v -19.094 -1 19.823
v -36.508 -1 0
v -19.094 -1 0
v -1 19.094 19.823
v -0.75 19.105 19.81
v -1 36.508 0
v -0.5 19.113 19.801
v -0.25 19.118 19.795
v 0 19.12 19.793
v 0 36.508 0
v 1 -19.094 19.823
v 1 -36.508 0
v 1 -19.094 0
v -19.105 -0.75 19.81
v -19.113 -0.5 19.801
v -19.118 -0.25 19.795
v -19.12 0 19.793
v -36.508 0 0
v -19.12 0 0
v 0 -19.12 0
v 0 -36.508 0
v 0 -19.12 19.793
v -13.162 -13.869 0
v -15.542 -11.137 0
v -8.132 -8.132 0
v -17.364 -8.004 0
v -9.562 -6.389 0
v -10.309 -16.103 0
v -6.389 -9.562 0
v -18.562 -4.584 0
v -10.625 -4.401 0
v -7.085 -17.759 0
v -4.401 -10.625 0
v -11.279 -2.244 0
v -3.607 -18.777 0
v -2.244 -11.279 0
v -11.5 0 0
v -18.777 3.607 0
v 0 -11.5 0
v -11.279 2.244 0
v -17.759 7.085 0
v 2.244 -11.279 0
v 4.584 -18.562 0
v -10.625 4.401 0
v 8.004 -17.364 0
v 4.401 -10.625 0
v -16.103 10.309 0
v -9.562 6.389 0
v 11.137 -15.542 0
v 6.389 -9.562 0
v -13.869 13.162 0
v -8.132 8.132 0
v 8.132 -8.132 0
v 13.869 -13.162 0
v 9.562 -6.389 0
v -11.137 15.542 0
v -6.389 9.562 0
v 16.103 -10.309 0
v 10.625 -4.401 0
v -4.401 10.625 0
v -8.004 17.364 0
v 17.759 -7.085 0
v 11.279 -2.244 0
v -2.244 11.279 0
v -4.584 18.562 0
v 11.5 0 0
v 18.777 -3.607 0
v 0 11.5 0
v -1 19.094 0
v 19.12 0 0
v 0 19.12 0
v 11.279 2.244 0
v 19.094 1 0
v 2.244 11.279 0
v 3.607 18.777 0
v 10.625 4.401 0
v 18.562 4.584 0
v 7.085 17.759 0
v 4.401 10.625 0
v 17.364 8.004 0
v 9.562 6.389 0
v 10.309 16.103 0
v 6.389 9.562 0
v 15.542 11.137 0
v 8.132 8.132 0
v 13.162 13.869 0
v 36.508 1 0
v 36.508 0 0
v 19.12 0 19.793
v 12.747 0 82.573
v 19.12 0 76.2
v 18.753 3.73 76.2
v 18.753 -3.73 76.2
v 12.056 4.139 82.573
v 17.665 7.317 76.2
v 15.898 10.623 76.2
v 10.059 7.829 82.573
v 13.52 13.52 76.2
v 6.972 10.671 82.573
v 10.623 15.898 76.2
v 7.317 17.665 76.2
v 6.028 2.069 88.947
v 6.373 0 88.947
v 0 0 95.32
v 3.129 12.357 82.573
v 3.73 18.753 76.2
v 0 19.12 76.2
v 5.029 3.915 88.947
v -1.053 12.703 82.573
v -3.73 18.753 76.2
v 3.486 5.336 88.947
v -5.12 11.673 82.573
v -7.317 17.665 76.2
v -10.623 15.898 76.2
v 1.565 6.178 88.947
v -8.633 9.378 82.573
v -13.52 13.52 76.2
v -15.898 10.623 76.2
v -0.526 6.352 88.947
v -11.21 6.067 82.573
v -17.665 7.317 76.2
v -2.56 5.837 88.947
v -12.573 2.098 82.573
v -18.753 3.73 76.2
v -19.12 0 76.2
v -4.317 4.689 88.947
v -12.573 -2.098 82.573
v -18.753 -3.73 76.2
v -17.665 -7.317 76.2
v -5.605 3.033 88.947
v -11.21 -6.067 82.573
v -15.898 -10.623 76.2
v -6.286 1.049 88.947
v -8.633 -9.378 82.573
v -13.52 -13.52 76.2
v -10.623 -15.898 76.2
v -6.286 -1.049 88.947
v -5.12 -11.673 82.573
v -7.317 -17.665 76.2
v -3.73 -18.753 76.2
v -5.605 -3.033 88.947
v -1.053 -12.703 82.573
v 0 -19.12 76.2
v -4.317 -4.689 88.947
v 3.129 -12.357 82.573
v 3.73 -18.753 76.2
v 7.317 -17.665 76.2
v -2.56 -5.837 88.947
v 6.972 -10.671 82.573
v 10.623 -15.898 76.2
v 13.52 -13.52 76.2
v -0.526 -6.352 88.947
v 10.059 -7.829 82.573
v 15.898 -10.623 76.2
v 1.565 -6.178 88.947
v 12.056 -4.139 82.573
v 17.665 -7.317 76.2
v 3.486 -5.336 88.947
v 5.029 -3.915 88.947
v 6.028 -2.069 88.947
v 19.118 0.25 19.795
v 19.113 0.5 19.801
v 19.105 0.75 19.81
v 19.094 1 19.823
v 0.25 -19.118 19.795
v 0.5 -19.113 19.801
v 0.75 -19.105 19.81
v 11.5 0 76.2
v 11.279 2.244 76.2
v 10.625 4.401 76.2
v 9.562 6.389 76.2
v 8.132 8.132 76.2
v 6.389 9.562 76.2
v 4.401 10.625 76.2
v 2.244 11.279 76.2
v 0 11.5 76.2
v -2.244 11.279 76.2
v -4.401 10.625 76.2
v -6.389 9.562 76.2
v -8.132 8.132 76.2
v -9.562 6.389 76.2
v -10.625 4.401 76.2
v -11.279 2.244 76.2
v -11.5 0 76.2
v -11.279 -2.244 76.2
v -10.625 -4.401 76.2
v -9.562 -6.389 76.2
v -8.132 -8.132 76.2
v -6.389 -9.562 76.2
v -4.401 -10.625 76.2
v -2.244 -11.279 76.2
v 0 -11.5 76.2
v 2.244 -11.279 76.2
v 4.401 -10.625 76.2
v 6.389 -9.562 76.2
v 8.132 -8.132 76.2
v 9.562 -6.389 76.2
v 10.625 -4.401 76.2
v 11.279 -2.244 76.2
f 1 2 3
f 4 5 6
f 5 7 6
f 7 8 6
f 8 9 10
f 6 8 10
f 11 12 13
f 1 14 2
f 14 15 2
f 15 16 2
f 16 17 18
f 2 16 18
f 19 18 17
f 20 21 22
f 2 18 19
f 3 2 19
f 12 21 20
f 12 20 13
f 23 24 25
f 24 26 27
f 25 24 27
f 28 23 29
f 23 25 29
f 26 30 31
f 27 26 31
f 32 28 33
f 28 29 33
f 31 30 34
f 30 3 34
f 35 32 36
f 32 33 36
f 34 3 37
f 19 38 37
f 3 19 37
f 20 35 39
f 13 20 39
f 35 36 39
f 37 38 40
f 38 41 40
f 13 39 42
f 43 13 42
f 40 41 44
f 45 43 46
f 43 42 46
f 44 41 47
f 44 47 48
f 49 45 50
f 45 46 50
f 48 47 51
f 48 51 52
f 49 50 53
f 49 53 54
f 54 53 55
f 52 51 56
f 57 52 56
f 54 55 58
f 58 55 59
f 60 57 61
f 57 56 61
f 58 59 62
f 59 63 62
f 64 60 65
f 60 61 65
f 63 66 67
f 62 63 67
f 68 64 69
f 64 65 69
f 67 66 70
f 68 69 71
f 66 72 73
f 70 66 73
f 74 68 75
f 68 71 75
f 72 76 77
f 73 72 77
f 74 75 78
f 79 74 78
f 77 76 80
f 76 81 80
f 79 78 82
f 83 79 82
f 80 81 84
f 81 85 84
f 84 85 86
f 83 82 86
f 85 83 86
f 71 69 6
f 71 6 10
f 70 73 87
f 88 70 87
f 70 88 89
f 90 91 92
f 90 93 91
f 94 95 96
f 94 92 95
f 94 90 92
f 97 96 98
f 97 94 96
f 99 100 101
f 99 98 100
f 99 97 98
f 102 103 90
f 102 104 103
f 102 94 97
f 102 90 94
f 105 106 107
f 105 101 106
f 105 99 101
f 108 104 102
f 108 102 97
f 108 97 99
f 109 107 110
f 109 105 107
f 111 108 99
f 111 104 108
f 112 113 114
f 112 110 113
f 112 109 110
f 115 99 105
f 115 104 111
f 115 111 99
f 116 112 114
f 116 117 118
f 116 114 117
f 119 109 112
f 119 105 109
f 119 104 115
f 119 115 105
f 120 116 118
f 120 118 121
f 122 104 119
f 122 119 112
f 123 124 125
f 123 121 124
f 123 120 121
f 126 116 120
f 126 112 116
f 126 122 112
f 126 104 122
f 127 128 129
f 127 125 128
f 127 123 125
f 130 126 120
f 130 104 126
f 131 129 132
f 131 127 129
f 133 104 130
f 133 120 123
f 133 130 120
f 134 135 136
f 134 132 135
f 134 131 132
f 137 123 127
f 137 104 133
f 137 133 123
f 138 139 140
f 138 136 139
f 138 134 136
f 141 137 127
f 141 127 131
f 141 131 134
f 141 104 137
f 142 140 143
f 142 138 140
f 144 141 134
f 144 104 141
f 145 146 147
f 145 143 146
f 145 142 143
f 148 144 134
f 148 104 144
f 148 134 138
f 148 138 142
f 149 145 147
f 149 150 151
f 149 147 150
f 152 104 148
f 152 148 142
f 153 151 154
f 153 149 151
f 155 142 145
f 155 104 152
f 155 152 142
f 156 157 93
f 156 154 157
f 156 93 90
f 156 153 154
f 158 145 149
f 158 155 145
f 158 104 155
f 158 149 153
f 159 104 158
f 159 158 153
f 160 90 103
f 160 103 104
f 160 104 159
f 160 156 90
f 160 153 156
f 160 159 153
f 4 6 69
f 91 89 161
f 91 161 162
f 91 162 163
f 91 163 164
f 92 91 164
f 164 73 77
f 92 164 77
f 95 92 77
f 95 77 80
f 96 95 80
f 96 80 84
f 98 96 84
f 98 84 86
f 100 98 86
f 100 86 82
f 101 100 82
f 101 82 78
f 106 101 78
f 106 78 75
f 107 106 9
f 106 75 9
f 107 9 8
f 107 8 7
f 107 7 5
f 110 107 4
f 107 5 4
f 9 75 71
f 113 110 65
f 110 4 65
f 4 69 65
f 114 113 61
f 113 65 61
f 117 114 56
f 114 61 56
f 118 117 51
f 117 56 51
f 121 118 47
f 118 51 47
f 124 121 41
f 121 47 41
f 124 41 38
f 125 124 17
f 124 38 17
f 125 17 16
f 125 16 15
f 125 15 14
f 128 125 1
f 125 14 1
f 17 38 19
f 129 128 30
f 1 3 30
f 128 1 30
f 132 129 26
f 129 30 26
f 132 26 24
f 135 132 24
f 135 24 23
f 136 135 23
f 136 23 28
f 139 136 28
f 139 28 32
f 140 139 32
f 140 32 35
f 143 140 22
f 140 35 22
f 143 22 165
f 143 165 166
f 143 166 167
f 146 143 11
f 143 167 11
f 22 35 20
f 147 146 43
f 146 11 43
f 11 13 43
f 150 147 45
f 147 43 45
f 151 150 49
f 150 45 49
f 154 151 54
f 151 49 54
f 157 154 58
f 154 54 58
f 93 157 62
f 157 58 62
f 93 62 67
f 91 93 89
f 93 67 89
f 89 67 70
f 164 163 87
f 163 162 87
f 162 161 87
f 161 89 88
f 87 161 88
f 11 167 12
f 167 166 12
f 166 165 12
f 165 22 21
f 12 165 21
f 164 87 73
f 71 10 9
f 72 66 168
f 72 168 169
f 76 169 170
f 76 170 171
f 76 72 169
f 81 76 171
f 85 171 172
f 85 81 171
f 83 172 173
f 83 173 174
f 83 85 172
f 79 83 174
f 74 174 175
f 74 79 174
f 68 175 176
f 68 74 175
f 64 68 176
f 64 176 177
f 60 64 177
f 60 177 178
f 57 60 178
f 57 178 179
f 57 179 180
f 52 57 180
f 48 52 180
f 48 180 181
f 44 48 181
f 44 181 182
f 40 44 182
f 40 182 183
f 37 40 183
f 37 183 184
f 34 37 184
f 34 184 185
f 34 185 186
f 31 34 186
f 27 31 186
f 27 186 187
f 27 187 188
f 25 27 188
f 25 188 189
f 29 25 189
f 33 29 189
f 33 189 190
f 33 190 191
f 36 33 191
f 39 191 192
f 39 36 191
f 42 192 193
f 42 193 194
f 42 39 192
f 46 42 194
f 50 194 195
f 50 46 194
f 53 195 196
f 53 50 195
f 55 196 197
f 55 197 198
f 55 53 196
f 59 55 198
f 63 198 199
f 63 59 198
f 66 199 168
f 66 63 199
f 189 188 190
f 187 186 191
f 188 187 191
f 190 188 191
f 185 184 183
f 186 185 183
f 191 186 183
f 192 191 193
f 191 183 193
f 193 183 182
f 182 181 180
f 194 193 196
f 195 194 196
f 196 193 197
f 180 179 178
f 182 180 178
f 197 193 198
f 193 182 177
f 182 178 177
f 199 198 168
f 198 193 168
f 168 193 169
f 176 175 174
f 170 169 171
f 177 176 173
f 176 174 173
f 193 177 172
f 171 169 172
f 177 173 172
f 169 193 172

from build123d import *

# Parameters (mm, degrees)
F0_R     = 19.12
F0_R_2   = 11.5
F1_DEPTH = 76.2
F2_R     = 19.12
F3_DEPTH = 50.8
F3_TAPER = 45
F5_DEPTH = 1
F6_COUNT = 4


with BuildPart() as f1:
    # F0 (on Top) → F1 (new body)
    with BuildSketch(Plane.XY):
        Circle(F0_R)
        Circle(F0_R_2, mode=Mode.SUBTRACT)
    extrude(amount=F1_DEPTH)

    # F2 (on face) → F3 (join)
    with BuildSketch(Plane.XY.offset(76.2)):
        Circle(F2_R)
    extrude(amount=F3_DEPTH, taper=F3_TAPER)

    # F4 (on Right) → F5 (join)
    with BuildSketch(Plane.YZ):
        Polygon((-36.5078145027, 0), (-13, 0), (-13, 26.7600230816), align=None)
    extrude(amount=F5_DEPTH)

    # F6: F1 ×4 about axis
    f6_axis = Axis((0, 0, 0), (0, 0, 1))


with BuildPart() as f1_1:
    add(f1.part)
    for i in range(1, F6_COUNT):
        add(f1.part.rotate(f6_axis, i * 360 / F6_COUNT))


solid = f1_1.part
